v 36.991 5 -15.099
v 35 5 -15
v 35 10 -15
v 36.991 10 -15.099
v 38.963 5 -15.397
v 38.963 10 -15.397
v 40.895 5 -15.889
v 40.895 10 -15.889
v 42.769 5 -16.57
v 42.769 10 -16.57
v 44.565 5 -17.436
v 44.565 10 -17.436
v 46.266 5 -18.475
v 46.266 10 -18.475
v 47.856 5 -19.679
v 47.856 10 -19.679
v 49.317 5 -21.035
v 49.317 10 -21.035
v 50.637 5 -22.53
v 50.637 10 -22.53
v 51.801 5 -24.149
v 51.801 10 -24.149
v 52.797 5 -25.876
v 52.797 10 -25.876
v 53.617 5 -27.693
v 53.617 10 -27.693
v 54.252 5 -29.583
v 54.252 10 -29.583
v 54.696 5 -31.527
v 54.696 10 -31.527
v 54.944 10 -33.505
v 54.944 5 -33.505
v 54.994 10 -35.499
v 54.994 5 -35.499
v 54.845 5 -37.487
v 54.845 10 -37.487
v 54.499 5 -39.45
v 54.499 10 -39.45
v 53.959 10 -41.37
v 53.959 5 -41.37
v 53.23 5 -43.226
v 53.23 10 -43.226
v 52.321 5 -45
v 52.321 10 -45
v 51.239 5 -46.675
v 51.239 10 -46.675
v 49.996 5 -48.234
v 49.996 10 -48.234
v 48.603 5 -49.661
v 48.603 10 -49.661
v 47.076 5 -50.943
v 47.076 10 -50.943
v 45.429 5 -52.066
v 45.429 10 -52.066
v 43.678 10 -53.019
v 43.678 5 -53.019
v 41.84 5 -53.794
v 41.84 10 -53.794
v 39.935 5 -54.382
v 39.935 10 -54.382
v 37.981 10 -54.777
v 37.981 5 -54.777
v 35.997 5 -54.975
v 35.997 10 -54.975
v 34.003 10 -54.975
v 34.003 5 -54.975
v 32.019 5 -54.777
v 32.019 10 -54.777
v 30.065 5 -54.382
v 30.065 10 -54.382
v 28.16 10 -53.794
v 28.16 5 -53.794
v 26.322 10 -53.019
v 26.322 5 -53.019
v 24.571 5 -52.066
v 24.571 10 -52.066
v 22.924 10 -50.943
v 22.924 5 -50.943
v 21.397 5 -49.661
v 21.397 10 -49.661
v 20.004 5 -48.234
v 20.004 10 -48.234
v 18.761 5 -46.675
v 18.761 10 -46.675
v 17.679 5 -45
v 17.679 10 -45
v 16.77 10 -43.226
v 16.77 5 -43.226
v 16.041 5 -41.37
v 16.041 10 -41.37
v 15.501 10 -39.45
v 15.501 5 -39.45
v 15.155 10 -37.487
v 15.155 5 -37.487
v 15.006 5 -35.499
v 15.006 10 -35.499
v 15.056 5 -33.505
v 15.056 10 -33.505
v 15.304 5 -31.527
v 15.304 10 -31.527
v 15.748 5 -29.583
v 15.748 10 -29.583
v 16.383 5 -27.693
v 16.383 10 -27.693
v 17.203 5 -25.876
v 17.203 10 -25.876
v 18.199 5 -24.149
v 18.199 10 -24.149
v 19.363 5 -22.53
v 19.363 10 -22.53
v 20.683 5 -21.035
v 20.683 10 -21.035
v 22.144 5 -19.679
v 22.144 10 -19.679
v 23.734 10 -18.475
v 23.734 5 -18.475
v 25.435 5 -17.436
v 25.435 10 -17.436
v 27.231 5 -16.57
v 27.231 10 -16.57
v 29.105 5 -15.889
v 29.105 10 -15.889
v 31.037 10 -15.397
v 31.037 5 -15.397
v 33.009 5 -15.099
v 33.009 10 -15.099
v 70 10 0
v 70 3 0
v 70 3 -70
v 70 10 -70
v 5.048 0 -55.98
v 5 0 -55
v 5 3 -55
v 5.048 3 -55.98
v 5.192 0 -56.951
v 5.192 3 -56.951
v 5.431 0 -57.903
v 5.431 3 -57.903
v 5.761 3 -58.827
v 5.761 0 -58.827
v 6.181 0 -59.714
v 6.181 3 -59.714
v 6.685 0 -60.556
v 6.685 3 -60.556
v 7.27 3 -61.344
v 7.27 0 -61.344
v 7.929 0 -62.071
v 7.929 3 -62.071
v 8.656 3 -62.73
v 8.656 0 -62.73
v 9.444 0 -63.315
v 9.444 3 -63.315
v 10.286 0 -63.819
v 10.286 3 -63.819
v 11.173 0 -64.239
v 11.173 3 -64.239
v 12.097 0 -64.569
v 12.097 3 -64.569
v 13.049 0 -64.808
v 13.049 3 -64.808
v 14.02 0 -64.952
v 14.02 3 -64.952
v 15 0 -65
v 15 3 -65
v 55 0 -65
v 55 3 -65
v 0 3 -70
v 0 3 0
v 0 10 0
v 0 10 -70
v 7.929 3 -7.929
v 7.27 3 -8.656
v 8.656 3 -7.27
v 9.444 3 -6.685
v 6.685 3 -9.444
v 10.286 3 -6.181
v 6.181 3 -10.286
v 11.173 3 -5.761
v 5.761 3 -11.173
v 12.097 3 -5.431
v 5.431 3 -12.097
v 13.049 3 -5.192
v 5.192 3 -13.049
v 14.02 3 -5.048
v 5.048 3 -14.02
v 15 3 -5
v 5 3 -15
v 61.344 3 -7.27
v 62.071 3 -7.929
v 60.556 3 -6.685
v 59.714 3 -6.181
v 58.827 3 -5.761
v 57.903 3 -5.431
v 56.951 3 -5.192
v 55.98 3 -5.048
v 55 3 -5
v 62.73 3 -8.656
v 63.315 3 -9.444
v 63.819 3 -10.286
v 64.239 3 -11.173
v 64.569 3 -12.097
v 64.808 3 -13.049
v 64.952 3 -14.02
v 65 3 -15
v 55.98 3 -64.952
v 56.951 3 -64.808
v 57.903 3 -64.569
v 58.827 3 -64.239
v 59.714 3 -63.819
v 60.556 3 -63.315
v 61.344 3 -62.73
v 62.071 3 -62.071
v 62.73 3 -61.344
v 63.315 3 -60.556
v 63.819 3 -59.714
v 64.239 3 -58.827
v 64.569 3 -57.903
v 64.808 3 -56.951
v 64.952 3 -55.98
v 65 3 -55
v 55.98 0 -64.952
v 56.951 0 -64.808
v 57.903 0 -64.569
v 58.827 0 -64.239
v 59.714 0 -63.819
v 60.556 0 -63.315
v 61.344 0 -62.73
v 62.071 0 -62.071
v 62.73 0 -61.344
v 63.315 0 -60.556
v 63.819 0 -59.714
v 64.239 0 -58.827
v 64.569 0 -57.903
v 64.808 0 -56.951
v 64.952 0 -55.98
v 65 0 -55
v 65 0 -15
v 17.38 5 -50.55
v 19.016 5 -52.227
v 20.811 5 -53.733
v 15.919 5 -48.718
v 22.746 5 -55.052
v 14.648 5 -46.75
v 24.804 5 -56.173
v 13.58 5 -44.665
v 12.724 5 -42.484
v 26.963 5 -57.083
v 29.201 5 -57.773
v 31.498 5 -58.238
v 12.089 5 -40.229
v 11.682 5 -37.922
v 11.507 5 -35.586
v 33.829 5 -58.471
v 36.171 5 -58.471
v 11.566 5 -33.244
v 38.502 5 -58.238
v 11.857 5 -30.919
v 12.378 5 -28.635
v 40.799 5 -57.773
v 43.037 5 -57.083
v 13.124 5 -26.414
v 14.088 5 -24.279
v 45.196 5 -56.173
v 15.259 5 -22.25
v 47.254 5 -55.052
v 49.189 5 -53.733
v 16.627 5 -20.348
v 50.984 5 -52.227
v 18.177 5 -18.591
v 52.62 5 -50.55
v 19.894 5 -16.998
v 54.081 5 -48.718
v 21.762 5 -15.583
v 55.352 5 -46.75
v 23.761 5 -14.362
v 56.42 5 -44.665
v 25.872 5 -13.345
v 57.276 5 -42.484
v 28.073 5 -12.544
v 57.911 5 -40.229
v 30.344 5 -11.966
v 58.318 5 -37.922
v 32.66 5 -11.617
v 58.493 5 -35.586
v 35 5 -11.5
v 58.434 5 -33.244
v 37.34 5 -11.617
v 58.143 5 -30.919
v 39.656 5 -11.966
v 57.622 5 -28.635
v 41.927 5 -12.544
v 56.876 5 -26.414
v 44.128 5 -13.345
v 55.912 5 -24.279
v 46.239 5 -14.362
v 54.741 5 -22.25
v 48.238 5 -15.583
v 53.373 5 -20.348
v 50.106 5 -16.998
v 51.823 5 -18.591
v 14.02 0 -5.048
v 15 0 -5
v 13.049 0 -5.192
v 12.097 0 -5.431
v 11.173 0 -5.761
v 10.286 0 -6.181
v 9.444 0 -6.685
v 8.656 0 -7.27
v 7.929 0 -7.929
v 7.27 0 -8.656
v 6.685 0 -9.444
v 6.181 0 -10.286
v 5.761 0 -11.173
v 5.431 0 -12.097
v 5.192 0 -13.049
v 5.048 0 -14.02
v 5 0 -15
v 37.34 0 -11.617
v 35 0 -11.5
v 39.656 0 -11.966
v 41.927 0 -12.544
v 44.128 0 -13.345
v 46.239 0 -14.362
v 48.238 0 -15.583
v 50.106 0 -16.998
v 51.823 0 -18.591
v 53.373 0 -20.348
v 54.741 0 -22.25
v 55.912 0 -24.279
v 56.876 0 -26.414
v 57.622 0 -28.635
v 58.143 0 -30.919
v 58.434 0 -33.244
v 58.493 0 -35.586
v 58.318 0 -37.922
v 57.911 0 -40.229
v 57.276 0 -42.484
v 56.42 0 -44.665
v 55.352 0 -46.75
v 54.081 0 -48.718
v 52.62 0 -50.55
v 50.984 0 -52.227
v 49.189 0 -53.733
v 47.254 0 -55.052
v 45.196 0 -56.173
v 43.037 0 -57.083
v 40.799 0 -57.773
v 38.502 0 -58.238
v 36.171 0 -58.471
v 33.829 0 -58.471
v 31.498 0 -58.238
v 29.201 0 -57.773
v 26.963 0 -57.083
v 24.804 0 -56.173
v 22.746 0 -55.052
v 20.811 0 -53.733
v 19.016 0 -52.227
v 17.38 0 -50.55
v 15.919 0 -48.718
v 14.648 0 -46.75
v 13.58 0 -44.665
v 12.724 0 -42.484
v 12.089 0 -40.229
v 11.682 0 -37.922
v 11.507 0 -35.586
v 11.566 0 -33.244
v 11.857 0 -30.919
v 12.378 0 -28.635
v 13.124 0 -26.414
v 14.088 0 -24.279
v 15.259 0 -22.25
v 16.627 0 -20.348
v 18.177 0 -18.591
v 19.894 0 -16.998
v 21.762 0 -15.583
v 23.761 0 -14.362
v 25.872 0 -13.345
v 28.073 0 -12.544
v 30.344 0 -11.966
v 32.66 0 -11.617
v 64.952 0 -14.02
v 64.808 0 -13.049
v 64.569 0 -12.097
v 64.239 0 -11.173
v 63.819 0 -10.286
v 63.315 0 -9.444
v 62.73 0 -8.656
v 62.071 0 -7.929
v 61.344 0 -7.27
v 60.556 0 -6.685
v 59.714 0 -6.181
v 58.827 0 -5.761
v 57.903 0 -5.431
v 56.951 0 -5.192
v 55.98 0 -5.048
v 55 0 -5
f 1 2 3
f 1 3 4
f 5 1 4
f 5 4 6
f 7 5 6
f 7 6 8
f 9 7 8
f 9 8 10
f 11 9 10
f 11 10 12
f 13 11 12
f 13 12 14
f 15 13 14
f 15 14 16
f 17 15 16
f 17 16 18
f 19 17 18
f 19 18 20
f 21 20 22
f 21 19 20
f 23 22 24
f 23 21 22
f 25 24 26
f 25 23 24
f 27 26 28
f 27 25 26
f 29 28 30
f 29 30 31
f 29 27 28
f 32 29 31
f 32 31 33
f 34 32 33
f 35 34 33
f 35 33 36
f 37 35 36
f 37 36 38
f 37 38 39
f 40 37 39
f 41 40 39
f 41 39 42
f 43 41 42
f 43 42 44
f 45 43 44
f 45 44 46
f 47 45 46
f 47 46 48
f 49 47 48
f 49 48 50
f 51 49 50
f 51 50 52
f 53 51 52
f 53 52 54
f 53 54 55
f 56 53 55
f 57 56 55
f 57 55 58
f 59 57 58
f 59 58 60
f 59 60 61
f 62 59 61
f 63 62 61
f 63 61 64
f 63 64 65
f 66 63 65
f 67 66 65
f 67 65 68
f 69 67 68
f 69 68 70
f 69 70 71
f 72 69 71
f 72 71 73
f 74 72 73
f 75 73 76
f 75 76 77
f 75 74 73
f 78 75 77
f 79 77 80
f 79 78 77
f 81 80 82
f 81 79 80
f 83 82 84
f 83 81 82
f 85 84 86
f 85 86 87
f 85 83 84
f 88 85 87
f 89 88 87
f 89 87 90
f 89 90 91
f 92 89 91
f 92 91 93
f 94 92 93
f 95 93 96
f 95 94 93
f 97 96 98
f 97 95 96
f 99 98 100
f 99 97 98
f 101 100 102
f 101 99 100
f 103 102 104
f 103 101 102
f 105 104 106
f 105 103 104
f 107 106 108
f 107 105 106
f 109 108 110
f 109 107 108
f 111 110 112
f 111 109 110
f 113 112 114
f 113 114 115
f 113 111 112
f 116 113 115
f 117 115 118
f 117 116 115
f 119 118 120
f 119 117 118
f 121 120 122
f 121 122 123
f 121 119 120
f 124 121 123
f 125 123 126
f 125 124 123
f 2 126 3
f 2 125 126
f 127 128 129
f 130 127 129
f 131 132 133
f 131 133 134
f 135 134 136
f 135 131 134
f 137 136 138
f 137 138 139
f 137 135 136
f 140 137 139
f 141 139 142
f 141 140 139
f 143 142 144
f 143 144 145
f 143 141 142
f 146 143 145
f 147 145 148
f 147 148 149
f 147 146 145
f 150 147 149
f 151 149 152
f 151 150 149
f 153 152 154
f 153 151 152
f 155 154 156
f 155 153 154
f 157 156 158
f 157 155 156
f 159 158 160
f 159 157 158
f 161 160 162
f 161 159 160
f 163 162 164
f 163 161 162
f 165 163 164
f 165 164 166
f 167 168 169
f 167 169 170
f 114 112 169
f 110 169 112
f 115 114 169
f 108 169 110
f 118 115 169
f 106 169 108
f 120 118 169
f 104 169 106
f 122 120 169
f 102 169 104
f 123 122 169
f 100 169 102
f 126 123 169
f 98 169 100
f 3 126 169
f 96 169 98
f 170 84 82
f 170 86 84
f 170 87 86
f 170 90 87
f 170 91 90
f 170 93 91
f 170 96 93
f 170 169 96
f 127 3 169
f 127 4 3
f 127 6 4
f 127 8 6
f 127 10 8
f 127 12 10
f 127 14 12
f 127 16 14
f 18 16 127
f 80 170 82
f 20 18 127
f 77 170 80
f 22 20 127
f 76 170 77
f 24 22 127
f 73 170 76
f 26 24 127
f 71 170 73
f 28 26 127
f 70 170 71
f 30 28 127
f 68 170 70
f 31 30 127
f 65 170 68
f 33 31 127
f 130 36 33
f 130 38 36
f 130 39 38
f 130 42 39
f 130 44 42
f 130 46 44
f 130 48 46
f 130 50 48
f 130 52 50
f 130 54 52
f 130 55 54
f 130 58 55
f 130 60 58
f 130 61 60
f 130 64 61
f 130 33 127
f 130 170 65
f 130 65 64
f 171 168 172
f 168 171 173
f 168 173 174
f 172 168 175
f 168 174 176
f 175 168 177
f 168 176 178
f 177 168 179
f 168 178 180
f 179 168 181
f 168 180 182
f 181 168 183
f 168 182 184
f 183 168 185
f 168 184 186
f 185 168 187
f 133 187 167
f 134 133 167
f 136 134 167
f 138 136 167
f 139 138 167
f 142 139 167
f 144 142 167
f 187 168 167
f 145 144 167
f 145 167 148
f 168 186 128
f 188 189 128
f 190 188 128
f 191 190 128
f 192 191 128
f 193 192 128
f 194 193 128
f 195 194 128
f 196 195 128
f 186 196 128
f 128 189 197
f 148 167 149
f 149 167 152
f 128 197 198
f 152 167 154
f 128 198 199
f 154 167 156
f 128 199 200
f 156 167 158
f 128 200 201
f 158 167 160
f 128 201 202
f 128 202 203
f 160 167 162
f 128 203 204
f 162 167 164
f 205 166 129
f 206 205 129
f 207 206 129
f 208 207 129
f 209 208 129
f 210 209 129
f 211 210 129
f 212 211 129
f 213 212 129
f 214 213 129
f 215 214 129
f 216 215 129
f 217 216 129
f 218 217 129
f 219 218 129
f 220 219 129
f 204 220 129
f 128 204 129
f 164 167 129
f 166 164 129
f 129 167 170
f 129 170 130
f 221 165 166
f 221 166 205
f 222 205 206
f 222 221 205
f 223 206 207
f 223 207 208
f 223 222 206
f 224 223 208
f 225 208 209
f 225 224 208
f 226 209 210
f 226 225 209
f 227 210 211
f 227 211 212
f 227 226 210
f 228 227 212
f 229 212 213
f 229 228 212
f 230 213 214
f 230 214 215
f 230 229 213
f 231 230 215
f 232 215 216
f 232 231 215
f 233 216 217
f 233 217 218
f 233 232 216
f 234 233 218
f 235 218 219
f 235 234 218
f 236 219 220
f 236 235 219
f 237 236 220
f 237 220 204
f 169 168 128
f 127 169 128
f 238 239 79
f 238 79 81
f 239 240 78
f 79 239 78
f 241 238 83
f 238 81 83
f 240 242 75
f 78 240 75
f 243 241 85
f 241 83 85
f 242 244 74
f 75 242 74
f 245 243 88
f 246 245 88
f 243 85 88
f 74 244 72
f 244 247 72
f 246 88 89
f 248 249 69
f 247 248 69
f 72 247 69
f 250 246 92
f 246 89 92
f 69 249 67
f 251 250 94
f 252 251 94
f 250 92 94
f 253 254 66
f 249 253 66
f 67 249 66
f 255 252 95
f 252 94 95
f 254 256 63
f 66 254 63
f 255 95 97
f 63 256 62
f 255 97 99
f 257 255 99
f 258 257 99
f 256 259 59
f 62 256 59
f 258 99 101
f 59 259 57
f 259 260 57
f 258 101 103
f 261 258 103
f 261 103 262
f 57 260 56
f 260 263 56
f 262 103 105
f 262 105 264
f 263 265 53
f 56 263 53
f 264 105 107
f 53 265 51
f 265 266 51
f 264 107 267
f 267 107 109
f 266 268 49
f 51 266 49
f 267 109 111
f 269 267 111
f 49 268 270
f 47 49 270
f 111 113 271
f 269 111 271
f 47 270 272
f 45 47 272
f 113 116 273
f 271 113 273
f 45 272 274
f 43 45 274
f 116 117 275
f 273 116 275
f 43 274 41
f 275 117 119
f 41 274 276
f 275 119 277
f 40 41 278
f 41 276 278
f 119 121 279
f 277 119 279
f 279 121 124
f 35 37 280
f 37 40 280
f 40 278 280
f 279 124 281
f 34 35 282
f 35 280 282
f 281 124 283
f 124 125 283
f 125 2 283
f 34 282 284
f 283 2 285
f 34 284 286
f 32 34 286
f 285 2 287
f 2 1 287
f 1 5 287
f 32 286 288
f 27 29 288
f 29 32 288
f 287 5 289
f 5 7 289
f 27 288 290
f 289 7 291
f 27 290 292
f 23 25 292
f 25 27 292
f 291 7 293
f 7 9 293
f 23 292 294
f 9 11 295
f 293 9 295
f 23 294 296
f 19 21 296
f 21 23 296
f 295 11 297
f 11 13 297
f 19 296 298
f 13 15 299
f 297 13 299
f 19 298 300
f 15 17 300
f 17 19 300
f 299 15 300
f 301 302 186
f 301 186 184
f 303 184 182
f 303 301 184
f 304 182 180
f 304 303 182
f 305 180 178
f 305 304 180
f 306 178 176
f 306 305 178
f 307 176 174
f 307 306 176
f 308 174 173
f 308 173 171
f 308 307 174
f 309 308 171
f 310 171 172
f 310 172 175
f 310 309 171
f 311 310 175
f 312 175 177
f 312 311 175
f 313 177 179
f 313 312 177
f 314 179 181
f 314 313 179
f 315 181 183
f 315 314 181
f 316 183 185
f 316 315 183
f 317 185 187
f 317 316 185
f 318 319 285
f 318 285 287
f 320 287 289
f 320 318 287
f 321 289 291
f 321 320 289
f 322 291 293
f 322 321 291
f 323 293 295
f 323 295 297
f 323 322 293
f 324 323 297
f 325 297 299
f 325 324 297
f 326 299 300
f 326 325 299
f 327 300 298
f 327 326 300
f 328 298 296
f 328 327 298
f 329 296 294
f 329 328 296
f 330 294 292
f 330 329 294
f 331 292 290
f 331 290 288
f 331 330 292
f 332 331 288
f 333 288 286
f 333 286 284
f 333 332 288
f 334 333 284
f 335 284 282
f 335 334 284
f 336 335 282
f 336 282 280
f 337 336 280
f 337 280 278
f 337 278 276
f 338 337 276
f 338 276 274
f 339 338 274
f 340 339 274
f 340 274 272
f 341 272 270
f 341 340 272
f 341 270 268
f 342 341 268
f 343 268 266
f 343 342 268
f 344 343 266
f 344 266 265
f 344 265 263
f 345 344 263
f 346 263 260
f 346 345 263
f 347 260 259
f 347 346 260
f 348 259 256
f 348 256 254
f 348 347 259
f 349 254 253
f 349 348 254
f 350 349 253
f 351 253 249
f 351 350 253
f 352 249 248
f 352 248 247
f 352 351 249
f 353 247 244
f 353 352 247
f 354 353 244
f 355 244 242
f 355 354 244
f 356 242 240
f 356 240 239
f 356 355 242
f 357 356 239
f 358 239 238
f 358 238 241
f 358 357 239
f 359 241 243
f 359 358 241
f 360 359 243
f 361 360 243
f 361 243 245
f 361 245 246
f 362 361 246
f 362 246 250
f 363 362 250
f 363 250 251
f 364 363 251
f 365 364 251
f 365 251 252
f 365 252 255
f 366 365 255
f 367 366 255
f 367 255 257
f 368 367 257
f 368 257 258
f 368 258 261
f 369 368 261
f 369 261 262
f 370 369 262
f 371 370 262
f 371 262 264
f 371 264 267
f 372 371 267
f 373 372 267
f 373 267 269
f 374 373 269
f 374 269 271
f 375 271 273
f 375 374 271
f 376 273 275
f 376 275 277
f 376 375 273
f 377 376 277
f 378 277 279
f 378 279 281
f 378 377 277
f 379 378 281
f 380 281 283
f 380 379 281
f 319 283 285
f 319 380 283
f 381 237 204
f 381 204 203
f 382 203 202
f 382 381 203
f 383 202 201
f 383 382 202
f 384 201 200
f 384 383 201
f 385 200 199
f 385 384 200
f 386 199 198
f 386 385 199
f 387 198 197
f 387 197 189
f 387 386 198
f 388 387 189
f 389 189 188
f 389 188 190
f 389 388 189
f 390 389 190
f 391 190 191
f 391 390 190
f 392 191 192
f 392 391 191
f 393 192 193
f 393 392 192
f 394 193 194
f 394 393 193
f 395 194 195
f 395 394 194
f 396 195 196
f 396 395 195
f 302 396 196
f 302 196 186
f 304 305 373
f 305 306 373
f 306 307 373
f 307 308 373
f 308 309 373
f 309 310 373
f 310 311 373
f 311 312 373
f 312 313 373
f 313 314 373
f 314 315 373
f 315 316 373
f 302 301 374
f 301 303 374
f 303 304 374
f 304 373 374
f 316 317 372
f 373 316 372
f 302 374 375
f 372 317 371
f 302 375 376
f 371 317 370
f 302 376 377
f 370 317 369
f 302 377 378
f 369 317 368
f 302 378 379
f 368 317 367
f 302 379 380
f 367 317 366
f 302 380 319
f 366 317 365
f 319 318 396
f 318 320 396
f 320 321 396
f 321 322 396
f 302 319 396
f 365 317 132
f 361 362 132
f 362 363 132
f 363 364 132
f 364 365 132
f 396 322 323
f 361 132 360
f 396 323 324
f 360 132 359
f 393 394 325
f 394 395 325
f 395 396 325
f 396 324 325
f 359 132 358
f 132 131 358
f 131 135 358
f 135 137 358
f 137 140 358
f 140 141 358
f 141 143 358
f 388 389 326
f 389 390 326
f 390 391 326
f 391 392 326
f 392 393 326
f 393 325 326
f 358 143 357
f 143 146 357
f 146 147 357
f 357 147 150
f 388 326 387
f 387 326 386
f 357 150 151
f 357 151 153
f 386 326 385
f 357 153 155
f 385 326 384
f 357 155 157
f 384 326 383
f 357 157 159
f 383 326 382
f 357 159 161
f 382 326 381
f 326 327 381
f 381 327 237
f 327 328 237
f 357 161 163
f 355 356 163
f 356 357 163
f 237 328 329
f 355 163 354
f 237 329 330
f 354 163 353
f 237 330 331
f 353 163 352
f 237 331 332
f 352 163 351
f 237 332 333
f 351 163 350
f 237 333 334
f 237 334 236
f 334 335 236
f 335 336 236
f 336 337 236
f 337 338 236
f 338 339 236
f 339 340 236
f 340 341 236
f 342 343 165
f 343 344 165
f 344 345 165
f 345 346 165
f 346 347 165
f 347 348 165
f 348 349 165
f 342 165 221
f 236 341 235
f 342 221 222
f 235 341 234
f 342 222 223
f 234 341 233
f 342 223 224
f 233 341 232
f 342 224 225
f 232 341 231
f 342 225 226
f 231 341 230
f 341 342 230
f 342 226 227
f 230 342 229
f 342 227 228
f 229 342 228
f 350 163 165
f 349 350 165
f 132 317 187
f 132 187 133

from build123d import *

# Parameters (mm, degrees)
SZKIC1_W                    = 70
SZKIC1_H                    = 70
SZKIC1_R                    = 20
DODANIE_WYCI_GNI_CIE1_DEPTH = 10
SZKIC1_3_W                  = 70
SZKIC1_3_H                  = 70
WYTNIJ_WYCI_GNI_CIE1_DEPTH  = 3
SZKIC1_4_R                  = 23.5
SZKIC1_4_R_2                = 20
WYTNIJ_WYCI_GNI_CIE2_DEPTH  = 5


with BuildPart() as part:
    # Szkic1 → Dodanie-wyciągnięcie1 (new body)
    with BuildSketch(Plane(origin=(0, 0, 0), x_dir=(1, 0, 0), z_dir=(0, 1, 0))):
        with Locations((35, 35)):
            Rectangle(SZKIC1_W, SZKIC1_H)
        with Locations((35, 35)):
            Circle(SZKIC1_R, mode=Mode.SUBTRACT)
    extrude(amount=DODANIE_WYCI_GNI_CIE1_DEPTH)

    # Szkic1<3> → Wytnij-wyciągnięcie1 (cut)
    with BuildSketch(Plane(origin=(0, 0, 0), x_dir=(1, 0, 0), z_dir=(0, 1, 0))):
        with Locations((35, 35)):
            Rectangle(SZKIC1_3_W, SZKIC1_3_H)
        with BuildLine():
            Line((5, 15), (5, 35))
            Line((5, 35), (5, 55))
            ThreePointArc((5, 55), (7.928932188, 62.071067812), (15, 65))
            Line((15, 65), (55, 65))
            ThreePointArc((55, 65), (62.071067812, 62.071067812), (65, 55))
            Line((65, 55), (65, 15))
            ThreePointArc((65, 15), (62.071067812, 7.928932188), (55, 5))
            Line((55, 5), (15, 5))
            ThreePointArc((15, 5), (7.928932188, 7.928932188), (5, 15))
        make_face(mode=Mode.SUBTRACT)
    extrude(amount=WYTNIJ_WYCI_GNI_CIE1_DEPTH, mode=Mode.SUBTRACT)

    # Szkic1<4> → Wytnij-wyciągnięcie2 (cut)
    with BuildSketch(Plane(origin=(0, 0, 0), x_dir=(1, 0, 0), z_dir=(0, 1, 0))):
        with Locations((35, 35)):
            Circle(SZKIC1_4_R)
        with Locations((35, 35)):
            Circle(SZKIC1_4_R_2, mode=Mode.SUBTRACT)
    extrude(amount=WYTNIJ_WYCI_GNI_CIE2_DEPTH, mode=Mode.SUBTRACT)


solid = part.part
